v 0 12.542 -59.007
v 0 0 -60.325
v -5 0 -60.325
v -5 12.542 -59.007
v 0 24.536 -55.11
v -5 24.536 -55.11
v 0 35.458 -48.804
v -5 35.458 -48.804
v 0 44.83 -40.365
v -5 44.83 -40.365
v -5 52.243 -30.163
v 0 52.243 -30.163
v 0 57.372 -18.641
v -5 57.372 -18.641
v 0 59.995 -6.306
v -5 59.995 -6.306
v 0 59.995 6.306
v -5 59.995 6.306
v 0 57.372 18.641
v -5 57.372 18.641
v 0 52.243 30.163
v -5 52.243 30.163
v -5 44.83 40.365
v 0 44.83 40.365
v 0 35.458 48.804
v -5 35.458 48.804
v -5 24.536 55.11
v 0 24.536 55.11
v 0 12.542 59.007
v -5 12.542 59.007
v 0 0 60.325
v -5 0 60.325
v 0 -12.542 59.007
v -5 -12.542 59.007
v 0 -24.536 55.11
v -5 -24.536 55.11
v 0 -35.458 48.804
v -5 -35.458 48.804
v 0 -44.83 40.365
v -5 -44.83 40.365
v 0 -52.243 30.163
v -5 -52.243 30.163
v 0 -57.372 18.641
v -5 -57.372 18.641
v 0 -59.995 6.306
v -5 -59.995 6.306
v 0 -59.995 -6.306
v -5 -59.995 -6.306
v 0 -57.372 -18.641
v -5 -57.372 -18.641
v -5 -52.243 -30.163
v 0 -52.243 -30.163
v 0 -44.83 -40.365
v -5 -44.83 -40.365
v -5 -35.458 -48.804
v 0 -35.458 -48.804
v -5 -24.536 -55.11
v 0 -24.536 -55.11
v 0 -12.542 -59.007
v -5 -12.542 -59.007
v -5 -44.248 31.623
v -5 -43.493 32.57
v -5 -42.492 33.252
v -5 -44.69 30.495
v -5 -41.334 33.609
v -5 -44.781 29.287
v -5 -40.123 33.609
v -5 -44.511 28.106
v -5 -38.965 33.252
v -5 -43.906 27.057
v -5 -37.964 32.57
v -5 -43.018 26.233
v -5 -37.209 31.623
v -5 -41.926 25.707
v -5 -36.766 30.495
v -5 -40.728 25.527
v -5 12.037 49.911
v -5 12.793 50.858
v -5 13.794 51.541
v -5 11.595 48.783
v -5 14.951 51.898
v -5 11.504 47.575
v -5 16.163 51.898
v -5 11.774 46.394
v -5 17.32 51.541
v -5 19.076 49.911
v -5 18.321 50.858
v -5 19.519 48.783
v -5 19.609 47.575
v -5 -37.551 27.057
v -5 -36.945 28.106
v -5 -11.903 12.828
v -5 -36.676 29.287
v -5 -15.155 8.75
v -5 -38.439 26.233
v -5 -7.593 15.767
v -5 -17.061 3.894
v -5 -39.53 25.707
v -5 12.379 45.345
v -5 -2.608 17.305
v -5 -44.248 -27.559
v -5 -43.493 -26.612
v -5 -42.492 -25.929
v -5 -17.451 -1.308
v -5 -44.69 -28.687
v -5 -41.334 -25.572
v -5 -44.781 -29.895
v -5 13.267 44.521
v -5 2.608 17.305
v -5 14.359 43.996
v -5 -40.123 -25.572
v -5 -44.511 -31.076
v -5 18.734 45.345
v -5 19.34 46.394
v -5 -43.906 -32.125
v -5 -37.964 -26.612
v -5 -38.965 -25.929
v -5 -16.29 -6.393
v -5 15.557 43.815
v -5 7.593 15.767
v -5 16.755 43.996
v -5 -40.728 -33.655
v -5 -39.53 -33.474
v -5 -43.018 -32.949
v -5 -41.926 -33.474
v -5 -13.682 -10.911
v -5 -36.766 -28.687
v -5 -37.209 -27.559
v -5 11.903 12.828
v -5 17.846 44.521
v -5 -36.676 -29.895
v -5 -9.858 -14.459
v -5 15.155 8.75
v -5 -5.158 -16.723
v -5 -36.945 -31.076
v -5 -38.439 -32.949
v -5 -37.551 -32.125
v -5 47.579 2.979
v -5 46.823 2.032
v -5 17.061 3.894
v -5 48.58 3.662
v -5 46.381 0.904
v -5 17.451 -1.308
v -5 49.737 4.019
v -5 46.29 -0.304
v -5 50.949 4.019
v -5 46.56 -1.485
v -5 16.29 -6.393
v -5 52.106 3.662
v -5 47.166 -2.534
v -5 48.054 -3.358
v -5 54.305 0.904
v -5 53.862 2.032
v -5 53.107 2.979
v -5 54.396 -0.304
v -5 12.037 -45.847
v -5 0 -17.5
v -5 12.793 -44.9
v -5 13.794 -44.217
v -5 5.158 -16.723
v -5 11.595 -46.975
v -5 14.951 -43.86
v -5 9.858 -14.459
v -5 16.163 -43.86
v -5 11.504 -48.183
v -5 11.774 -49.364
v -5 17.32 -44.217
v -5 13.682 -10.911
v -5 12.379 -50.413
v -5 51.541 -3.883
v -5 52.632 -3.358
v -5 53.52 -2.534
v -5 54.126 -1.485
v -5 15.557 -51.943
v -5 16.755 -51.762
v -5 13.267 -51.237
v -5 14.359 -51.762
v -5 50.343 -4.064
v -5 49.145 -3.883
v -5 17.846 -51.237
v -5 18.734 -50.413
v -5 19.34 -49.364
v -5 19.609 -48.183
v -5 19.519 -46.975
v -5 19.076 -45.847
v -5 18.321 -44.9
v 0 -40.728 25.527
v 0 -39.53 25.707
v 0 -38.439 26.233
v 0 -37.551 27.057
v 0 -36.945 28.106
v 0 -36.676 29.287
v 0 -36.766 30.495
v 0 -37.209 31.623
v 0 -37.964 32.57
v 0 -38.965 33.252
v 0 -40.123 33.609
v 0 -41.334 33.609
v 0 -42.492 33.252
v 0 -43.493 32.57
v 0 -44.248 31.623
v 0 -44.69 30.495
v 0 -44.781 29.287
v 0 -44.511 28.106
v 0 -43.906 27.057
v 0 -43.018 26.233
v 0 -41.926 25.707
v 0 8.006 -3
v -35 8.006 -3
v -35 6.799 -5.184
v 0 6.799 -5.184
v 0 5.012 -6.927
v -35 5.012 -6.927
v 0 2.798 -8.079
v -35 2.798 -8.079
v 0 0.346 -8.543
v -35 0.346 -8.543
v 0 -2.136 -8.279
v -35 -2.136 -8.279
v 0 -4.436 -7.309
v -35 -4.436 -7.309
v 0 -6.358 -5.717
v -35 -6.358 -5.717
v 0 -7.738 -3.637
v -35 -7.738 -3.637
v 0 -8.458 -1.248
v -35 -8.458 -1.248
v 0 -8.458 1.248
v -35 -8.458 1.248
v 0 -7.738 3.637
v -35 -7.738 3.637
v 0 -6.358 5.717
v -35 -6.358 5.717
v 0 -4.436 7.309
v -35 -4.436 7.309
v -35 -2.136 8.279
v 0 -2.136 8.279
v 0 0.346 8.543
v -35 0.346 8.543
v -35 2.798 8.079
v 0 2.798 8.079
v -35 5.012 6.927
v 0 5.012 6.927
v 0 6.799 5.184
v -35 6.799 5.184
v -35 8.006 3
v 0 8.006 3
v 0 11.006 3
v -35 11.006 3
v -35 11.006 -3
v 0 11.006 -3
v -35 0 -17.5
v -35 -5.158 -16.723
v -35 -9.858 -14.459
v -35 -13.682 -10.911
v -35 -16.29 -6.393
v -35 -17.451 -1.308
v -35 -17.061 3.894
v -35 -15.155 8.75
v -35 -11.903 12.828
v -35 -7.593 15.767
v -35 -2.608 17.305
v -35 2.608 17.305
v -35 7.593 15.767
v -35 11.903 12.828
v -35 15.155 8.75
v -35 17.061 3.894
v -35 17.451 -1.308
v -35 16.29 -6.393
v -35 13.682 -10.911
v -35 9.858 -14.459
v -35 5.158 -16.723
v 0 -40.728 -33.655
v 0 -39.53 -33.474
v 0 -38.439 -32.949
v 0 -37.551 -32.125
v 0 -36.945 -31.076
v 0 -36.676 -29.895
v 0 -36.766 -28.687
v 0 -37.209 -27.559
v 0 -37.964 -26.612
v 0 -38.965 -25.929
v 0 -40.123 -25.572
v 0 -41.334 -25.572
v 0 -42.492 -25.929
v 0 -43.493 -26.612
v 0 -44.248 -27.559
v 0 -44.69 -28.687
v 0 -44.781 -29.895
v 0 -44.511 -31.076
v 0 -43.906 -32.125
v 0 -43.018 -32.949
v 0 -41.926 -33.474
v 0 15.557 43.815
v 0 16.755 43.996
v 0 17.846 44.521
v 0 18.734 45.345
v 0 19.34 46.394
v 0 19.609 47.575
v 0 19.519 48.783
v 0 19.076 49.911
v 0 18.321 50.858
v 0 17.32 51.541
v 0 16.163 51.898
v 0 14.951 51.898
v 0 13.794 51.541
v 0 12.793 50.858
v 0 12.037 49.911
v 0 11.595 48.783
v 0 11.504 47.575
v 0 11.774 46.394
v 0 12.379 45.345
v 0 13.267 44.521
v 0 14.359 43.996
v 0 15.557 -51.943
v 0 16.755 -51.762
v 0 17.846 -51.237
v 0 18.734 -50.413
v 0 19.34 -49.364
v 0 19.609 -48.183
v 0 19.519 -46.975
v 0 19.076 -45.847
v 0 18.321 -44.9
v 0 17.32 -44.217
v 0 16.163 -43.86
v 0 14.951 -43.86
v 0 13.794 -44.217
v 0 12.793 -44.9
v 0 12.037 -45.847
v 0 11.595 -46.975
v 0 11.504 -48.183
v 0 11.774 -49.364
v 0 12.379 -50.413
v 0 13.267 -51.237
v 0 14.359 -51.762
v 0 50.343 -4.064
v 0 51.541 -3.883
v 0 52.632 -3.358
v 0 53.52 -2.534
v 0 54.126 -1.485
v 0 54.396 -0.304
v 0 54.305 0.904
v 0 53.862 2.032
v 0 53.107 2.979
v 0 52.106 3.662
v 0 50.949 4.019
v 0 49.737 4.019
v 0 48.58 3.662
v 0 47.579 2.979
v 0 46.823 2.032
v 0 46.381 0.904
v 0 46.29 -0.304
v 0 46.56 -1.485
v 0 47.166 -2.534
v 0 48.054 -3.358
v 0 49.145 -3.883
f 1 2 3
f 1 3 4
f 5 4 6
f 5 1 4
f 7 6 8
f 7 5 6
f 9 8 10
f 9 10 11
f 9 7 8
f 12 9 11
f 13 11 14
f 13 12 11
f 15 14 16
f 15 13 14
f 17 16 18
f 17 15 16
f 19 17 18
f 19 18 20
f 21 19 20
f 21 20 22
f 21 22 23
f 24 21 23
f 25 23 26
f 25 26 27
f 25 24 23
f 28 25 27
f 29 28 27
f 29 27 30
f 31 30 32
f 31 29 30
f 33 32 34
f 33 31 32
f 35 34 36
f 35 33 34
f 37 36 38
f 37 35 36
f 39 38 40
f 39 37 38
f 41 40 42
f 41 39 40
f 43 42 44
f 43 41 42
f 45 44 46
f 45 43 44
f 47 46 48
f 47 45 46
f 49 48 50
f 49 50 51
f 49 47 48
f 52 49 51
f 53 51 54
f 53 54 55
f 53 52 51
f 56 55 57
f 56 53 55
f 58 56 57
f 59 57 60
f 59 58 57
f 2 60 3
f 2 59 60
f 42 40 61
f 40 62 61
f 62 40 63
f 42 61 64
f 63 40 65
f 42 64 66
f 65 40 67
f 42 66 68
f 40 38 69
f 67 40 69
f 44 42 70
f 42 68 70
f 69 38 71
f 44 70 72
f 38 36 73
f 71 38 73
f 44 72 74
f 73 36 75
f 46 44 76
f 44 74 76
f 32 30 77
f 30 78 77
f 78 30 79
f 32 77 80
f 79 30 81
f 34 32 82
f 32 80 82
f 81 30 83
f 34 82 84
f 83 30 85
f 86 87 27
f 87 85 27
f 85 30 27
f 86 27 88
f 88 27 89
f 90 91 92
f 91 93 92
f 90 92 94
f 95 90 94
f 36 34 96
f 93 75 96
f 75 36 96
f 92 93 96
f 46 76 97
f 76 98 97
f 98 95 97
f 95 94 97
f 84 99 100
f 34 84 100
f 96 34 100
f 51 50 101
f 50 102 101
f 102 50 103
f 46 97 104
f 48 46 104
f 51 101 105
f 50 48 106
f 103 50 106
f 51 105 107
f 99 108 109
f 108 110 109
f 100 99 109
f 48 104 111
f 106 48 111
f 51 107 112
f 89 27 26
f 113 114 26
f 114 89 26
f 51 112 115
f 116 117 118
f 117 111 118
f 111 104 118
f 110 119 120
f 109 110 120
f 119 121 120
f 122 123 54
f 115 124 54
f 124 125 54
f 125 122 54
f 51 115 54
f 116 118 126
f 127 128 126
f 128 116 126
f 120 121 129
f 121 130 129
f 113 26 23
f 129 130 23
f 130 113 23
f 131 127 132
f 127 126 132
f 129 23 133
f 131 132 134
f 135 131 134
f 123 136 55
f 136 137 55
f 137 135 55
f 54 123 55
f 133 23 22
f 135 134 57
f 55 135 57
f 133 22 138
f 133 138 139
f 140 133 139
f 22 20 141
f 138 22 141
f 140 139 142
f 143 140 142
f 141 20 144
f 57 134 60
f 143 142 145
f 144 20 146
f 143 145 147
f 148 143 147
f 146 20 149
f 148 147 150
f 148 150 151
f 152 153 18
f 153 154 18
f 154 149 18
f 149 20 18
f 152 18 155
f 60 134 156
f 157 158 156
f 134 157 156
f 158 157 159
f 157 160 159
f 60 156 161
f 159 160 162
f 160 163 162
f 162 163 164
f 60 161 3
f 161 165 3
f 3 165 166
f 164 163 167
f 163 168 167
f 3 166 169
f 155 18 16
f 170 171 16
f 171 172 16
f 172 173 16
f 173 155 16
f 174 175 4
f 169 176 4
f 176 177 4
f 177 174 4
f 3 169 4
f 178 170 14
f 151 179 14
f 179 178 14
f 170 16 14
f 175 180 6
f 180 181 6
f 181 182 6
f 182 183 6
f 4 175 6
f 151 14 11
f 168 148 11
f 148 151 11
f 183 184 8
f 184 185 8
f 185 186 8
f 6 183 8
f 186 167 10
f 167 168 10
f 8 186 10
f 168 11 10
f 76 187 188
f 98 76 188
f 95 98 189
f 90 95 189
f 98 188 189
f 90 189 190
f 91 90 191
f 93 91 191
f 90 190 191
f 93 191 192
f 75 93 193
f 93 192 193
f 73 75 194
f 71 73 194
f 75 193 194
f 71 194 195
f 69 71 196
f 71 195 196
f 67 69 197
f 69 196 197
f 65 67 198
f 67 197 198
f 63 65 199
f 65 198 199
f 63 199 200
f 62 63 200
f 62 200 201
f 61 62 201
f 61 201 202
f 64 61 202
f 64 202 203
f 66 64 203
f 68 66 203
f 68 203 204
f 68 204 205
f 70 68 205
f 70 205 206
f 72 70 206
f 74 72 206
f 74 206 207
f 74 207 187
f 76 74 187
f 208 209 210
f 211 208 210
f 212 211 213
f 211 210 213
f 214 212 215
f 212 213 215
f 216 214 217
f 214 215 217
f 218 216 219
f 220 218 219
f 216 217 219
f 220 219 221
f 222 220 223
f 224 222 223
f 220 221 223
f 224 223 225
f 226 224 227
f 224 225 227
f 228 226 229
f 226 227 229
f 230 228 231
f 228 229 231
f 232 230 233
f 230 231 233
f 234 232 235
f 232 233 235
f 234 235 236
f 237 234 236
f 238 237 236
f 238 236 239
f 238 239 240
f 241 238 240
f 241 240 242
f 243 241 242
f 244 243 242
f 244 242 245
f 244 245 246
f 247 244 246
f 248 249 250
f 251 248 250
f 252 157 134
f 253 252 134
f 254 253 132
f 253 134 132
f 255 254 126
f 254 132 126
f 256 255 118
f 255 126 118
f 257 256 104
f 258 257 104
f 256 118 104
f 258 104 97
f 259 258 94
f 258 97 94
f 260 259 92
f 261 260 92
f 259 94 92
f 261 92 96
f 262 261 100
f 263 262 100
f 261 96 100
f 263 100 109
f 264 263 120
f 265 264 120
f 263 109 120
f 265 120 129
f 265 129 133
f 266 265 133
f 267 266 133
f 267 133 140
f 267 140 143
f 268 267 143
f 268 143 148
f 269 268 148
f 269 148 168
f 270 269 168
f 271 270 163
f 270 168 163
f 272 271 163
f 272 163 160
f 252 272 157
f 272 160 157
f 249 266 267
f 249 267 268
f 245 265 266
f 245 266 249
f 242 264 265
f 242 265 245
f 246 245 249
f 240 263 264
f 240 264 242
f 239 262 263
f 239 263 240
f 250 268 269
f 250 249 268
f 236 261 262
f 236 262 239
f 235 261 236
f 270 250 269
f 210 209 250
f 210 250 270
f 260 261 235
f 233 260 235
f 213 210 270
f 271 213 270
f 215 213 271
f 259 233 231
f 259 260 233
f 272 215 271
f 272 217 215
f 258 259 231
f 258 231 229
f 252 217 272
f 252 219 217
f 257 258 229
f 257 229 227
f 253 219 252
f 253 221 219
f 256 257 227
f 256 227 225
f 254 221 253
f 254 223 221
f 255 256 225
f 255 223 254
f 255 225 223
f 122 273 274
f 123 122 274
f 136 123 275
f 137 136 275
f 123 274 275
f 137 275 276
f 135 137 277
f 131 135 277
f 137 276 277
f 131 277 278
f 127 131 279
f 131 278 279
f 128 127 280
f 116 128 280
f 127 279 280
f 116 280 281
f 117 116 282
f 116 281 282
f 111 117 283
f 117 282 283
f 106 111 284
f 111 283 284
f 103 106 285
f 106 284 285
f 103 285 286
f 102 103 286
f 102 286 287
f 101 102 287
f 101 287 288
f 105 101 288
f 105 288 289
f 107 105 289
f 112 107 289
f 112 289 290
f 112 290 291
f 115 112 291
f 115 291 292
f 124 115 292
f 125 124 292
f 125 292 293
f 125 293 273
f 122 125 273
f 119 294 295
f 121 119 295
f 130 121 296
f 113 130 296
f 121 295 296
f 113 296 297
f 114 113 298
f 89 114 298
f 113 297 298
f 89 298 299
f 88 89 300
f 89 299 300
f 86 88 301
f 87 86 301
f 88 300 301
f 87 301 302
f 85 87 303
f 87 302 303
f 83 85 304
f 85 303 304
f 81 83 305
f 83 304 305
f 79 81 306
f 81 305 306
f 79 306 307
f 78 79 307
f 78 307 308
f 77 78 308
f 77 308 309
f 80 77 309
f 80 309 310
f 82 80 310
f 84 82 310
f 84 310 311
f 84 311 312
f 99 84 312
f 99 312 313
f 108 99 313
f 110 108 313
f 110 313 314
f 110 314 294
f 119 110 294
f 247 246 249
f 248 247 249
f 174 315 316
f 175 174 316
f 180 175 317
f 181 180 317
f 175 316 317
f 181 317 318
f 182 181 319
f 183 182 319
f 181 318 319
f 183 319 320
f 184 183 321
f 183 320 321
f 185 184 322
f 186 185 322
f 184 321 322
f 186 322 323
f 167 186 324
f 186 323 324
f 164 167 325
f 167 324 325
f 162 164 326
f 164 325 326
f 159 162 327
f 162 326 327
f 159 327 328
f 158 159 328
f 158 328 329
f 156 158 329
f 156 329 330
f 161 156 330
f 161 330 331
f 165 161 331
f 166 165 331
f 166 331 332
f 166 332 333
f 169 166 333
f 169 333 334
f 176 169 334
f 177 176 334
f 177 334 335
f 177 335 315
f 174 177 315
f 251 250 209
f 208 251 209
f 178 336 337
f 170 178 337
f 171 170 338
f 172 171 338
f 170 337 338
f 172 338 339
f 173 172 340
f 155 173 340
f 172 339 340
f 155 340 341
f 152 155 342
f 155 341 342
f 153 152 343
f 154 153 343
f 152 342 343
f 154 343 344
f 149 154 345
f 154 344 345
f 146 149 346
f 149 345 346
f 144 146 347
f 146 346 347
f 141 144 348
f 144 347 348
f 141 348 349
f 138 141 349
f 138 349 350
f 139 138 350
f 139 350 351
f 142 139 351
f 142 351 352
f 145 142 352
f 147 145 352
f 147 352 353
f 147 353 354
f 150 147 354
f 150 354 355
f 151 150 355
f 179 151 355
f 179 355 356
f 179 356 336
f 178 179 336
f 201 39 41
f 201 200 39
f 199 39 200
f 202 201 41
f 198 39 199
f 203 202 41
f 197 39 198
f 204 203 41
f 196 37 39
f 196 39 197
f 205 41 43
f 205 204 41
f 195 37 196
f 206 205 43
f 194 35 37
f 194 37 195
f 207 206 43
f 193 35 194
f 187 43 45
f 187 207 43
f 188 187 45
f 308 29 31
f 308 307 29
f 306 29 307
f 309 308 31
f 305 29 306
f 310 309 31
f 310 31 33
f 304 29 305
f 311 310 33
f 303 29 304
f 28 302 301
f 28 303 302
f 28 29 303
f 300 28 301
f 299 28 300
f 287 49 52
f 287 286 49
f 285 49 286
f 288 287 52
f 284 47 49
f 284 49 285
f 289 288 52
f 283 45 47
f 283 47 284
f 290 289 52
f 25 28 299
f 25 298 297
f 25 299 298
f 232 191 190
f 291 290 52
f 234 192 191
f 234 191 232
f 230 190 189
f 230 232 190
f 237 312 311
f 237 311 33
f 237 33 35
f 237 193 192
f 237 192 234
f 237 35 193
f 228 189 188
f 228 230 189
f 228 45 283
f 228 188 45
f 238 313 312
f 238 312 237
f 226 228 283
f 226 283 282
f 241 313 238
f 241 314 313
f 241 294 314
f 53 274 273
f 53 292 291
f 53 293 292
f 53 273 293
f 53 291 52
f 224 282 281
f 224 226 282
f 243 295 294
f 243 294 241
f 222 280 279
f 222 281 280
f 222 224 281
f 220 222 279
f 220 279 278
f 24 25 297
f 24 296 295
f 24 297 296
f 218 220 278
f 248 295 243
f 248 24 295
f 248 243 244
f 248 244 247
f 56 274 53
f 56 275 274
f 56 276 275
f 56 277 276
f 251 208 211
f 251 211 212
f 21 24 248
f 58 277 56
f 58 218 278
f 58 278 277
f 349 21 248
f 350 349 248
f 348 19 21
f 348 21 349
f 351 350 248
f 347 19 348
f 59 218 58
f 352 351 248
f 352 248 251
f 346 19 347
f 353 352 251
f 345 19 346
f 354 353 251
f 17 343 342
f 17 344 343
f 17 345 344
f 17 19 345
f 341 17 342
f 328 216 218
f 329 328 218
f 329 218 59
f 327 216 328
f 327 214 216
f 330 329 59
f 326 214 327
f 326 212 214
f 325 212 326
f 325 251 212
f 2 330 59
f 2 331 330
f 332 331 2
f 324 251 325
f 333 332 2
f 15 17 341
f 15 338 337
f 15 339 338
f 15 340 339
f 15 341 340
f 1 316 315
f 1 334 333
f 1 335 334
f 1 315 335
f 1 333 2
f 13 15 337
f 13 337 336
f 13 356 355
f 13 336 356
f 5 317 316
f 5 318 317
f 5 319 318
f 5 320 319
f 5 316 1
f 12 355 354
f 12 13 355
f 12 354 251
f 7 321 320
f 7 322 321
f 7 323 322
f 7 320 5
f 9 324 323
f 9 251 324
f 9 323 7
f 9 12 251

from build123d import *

# Parameters (mm, degrees)
SKETCH1_R           = 60.325
BOSS_EXTRUDE1_DEPTH = 5
SKETCH2_R           = 4.064
CUT_EXTRUDE1_DEPTH  = 86.458827806
SKETCH11_R          = 17.5
BOSS_EXTRUDE3_DEPTH = 30
CUT_EXTRUDE5_DEPTH  = 93.212858377


with BuildPart() as part:
    # Sketch1 → Boss-Extrude1 (new body)
    with BuildSketch(Plane(origin=(0, 0, 0), x_dir=(0, 0, -1), z_dir=(1, 0, 0))):
        Circle(SKETCH1_R)
    extrude(amount=-BOSS_EXTRUDE1_DEPTH)

    # Sketch2 → Cut-Extrude1 (cut, through all)
    with BuildSketch(Plane(origin=(0, 0, 0), x_dir=(0, 0, -1), z_dir=(1, 0, 0))):
        with Locations((0, 50.342959834)):
            Circle(SKETCH2_R)
        with Locations((47.879, 15.556830136)):
            Circle(SKETCH2_R)
        with Locations((29.590849347, -40.728310053)):
            Circle(SKETCH2_R)
        with Locations((-29.590849347, -40.728310053)):
            Circle(SKETCH2_R)
        with Locations((-47.879, 15.556830136)):
            Circle(SKETCH2_R)
    extrude(amount=-CUT_EXTRUDE1_DEPTH, mode=Mode.SUBTRACT)

    # Sketch11 → Boss-Extrude3 (add)
    with BuildSketch(Plane.ZY.offset(5)):
        with Locations(Location((0, 0, 0), (0, 0, 180))):
            Circle(SKETCH11_R)
    extrude(amount=BOSS_EXTRUDE3_DEPTH)

    # Sketch12 → Cut-Extrude5 (cut, through all)
    with BuildSketch(Plane.ZY.offset(35)):
        with BuildLine():
            Line((0, 11.006403687), (-3, 11.006403687))
            Line((-3, 11.006403687), (-3, 8.006403687))
            ThreePointArc((-3, 8.006403687), (0, -8.55), (3, 8.006403687))
            Line((3, 8.006403687), (3, 11.006403687))
            Line((3, 11.006403687), (0, 11.006403687))
        make_face()
    extrude(amount=-CUT_EXTRUDE5_DEPTH, mode=Mode.SUBTRACT)


solid = part.part
